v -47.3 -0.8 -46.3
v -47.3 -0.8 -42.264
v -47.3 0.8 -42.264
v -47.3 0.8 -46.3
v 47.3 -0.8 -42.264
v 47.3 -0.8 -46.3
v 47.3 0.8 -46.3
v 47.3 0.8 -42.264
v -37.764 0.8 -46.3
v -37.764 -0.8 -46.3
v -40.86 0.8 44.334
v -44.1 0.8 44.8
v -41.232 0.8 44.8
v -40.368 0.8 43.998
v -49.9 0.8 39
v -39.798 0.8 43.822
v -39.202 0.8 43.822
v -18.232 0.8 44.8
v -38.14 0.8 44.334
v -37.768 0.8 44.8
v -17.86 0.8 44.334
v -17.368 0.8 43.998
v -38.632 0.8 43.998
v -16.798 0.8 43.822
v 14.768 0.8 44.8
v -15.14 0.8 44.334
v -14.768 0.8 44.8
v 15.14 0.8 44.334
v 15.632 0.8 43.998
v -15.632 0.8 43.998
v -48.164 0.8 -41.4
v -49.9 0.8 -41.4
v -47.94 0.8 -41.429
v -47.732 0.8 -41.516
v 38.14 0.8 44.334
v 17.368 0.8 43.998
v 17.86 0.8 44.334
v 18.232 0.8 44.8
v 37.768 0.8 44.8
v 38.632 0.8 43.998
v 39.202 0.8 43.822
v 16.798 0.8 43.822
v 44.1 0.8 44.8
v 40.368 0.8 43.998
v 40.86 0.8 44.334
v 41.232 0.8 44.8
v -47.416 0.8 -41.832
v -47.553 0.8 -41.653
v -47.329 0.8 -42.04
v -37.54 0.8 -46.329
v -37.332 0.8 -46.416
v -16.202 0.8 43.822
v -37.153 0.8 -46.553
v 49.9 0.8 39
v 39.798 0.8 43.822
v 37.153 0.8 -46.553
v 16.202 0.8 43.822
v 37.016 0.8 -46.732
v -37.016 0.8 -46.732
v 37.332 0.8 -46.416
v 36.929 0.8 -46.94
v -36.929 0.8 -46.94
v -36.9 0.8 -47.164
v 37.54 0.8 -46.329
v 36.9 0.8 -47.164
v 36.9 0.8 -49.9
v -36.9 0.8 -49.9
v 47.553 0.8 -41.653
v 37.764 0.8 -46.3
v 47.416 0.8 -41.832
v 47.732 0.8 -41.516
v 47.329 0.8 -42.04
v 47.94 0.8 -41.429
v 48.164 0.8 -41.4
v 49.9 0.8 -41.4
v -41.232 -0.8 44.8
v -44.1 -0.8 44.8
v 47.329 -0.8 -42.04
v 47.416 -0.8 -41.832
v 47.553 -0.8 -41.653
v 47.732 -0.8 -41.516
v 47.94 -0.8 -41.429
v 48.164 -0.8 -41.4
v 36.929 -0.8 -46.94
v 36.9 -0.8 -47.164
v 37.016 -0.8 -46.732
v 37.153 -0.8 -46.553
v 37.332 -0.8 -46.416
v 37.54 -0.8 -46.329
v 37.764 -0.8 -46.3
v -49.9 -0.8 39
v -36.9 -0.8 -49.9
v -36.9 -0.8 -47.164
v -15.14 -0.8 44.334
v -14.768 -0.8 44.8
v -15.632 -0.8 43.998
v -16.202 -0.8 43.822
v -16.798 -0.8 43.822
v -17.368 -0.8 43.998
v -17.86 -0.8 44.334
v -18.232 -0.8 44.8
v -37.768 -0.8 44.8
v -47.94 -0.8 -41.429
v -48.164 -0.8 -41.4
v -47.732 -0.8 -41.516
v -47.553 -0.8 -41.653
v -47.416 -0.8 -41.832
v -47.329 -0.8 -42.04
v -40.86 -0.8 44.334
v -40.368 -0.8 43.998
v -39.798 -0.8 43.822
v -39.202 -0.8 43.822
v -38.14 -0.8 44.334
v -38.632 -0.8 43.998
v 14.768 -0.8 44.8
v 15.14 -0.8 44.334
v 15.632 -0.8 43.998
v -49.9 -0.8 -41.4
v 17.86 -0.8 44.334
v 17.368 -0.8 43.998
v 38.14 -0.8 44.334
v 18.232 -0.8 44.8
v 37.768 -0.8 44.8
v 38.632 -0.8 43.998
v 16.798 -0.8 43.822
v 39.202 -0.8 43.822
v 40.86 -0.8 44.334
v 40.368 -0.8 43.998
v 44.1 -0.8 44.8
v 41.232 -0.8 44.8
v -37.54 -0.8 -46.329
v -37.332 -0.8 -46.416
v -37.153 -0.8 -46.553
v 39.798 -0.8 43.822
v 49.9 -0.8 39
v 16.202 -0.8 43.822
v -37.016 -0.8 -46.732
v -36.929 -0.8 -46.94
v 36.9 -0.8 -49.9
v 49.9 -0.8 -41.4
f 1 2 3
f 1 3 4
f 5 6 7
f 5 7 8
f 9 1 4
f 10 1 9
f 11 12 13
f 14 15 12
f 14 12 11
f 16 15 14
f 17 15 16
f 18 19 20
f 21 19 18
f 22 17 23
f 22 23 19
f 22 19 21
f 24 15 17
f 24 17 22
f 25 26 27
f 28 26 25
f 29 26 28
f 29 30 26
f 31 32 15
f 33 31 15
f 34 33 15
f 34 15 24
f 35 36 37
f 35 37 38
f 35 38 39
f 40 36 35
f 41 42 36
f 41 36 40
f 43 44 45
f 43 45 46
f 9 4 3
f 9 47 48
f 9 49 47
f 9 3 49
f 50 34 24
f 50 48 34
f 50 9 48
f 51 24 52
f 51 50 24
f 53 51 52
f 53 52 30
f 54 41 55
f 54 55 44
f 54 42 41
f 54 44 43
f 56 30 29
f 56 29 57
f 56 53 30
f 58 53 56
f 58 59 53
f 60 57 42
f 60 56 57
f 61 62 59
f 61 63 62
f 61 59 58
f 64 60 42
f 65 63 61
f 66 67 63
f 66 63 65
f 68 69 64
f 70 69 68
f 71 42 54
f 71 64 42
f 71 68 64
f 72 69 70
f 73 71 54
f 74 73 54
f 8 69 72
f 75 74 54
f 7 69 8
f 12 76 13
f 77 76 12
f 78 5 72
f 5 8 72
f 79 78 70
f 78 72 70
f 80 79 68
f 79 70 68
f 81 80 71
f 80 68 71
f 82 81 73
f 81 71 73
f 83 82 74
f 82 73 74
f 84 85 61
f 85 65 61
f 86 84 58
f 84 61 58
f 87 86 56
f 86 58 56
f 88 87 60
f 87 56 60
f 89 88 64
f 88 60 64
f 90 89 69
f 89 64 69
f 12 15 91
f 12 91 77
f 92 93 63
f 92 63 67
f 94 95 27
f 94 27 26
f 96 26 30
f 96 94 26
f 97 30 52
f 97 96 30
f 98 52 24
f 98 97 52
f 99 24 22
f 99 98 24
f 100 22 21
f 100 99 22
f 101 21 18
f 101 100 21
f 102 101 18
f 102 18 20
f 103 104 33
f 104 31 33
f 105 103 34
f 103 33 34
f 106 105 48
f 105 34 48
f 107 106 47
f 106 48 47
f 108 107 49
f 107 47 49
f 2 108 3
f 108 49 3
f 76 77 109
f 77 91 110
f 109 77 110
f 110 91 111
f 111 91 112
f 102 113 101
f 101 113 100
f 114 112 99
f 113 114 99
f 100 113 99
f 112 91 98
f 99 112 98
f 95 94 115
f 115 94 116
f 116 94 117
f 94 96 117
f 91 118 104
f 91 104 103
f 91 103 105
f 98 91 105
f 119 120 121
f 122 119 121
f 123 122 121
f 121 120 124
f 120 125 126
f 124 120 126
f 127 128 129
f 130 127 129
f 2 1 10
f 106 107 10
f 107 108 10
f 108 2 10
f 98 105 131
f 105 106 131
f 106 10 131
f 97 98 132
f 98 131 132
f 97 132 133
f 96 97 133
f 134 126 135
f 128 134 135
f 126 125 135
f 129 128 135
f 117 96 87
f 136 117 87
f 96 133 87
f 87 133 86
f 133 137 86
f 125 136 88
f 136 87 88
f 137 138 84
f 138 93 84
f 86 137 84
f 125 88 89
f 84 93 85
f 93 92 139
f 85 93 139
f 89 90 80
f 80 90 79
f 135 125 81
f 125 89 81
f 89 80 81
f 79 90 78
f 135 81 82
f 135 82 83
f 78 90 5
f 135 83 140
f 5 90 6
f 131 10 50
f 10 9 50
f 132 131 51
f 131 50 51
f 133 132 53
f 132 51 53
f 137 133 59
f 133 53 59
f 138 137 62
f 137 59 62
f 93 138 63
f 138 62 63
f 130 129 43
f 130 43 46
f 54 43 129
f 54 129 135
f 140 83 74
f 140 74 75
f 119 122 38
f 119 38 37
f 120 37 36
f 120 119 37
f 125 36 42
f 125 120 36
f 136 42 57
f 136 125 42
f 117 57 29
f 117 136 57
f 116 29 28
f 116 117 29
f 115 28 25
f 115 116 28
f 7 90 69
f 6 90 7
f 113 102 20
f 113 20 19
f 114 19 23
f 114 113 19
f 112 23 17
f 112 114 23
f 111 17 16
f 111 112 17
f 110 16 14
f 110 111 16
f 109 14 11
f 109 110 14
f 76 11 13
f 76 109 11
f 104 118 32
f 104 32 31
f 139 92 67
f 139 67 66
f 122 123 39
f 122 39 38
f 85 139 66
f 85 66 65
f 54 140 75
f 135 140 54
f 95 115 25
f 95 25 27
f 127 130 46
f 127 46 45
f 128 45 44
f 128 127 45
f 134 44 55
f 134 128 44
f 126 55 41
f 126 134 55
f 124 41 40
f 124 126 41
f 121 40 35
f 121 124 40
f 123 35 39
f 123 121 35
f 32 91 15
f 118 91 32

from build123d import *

# Parameters (mm, degrees)
GENERALSHAPE_DEPTH   = 0.8
ADDTOLERANCE_START   = -0.8
ADDTOLERANCE_DEPTH   = 1.6
BACKPLANE_DEPTH      = 71.573791169
BACKPLANE_DEPTH_BACK = 71.573791169
FILLET2_R            = 0.8636


# Read off the part's stored shape, not the designer's step: AddTolerance
with BuildPart() as part:
    # Sketch2 → GeneralShape (new, symmetric)
    with BuildSketch(Plane(origin=(0, 0, 0), x_dir=(1, 0, 0), z_dir=(0, 1, 0))):
        Polygon((47.4, 46.4), (37, 46.4), (37, 50), (-37, 50), (-37, 46.4), (-47.4, 46.4), (-47.4, 41.5), (-50, 41.5), (-50, -38.9), (-41.5, -47.4), (41.5, -47.4), (50, -38.9), (50, 41.5), (47.4, 41.5), align=None)
    extrude(amount=GENERALSHAPE_DEPTH, both=True)

    # AddTolerance outline → AddTolerance (cut)
    with BuildSketch(Plane(origin=(0, 0, 0), x_dir=(1, 0, 0), z_dir=(0, 1, 0)).offset(ADDTOLERANCE_START)):
        Polygon((49.9, 41.4), (49.9, -39), (50, -38.9), (50, 41.5), (47.4, 41.5), (47.4, 46.4), (37, 46.4), (37, 50), (-37, 50), (-37, 46.4), (-47.4, 46.4), (-47.4, 41.5), (-50, 41.5), (-50, -38.9), (-49.9, -39), (-49.9, 41.4), (-47.3, 41.4), (-47.3, 46.3), (-36.9, 46.3), (-36.9, 49.9), (36.9, 49.9), (36.9, 46.3), (47.3, 46.3), (47.3, 41.4), align=None)
    extrude(amount=ADDTOLERANCE_DEPTH, mode=Mode.SUBTRACT)

    # Sketch4 → Backplane (cut, two sides: drawn at the far end of the back side and taken through both)
    with BuildSketch(Plane(origin=(0, 0, 0), x_dir=(1, 0, 0), z_dir=(0, 1, 0)).offset(-BACKPLANE_DEPTH_BACK)):
        with BuildLine():
            Line((41.5, -47.4), (44.1, -44.8))
            Line((44.1, -44.8), (41.232050808, -44.8))
            ThreePointArc((41.232050808, -44.8), (39.5, -43.8), (37.767949192, -44.8))
            Line((37.767949192, -44.8), (18.232050808, -44.8))
            ThreePointArc((18.232050808, -44.8), (16.5, -43.8), (14.767949192, -44.8))
            Line((14.767949192, -44.8), (-14.767949192, -44.8))
            ThreePointArc((-14.767949192, -44.8), (-16.5, -43.8), (-18.232050808, -44.8))
            Line((-18.232050808, -44.8), (-37.767949192, -44.8))
            ThreePointArc((-37.767949192, -44.8), (-39.5, -43.8), (-41.232050808, -44.8))
            Line((-41.232050808, -44.8), (-44.1, -44.8))
            Line((-44.1, -44.8), (-41.5, -47.4))
            Line((-41.5, -47.4), (41.5, -47.4))
        make_face()
    extrude(amount=BACKPLANE_DEPTH + BACKPLANE_DEPTH_BACK, mode=Mode.SUBTRACT)

    # Fillet2
    fillet2_edges = [part.edges().sort_by_distance(p)[0] for p in [
        (47.3, 0, -41.4),
        (36.9, 0, -46.3),
        (-36.9, 0, -46.3),
        (-47.3, 0, -41.4),
    ]]
    fillet(fillet2_edges, radius=FILLET2_R)


solid = part.part
